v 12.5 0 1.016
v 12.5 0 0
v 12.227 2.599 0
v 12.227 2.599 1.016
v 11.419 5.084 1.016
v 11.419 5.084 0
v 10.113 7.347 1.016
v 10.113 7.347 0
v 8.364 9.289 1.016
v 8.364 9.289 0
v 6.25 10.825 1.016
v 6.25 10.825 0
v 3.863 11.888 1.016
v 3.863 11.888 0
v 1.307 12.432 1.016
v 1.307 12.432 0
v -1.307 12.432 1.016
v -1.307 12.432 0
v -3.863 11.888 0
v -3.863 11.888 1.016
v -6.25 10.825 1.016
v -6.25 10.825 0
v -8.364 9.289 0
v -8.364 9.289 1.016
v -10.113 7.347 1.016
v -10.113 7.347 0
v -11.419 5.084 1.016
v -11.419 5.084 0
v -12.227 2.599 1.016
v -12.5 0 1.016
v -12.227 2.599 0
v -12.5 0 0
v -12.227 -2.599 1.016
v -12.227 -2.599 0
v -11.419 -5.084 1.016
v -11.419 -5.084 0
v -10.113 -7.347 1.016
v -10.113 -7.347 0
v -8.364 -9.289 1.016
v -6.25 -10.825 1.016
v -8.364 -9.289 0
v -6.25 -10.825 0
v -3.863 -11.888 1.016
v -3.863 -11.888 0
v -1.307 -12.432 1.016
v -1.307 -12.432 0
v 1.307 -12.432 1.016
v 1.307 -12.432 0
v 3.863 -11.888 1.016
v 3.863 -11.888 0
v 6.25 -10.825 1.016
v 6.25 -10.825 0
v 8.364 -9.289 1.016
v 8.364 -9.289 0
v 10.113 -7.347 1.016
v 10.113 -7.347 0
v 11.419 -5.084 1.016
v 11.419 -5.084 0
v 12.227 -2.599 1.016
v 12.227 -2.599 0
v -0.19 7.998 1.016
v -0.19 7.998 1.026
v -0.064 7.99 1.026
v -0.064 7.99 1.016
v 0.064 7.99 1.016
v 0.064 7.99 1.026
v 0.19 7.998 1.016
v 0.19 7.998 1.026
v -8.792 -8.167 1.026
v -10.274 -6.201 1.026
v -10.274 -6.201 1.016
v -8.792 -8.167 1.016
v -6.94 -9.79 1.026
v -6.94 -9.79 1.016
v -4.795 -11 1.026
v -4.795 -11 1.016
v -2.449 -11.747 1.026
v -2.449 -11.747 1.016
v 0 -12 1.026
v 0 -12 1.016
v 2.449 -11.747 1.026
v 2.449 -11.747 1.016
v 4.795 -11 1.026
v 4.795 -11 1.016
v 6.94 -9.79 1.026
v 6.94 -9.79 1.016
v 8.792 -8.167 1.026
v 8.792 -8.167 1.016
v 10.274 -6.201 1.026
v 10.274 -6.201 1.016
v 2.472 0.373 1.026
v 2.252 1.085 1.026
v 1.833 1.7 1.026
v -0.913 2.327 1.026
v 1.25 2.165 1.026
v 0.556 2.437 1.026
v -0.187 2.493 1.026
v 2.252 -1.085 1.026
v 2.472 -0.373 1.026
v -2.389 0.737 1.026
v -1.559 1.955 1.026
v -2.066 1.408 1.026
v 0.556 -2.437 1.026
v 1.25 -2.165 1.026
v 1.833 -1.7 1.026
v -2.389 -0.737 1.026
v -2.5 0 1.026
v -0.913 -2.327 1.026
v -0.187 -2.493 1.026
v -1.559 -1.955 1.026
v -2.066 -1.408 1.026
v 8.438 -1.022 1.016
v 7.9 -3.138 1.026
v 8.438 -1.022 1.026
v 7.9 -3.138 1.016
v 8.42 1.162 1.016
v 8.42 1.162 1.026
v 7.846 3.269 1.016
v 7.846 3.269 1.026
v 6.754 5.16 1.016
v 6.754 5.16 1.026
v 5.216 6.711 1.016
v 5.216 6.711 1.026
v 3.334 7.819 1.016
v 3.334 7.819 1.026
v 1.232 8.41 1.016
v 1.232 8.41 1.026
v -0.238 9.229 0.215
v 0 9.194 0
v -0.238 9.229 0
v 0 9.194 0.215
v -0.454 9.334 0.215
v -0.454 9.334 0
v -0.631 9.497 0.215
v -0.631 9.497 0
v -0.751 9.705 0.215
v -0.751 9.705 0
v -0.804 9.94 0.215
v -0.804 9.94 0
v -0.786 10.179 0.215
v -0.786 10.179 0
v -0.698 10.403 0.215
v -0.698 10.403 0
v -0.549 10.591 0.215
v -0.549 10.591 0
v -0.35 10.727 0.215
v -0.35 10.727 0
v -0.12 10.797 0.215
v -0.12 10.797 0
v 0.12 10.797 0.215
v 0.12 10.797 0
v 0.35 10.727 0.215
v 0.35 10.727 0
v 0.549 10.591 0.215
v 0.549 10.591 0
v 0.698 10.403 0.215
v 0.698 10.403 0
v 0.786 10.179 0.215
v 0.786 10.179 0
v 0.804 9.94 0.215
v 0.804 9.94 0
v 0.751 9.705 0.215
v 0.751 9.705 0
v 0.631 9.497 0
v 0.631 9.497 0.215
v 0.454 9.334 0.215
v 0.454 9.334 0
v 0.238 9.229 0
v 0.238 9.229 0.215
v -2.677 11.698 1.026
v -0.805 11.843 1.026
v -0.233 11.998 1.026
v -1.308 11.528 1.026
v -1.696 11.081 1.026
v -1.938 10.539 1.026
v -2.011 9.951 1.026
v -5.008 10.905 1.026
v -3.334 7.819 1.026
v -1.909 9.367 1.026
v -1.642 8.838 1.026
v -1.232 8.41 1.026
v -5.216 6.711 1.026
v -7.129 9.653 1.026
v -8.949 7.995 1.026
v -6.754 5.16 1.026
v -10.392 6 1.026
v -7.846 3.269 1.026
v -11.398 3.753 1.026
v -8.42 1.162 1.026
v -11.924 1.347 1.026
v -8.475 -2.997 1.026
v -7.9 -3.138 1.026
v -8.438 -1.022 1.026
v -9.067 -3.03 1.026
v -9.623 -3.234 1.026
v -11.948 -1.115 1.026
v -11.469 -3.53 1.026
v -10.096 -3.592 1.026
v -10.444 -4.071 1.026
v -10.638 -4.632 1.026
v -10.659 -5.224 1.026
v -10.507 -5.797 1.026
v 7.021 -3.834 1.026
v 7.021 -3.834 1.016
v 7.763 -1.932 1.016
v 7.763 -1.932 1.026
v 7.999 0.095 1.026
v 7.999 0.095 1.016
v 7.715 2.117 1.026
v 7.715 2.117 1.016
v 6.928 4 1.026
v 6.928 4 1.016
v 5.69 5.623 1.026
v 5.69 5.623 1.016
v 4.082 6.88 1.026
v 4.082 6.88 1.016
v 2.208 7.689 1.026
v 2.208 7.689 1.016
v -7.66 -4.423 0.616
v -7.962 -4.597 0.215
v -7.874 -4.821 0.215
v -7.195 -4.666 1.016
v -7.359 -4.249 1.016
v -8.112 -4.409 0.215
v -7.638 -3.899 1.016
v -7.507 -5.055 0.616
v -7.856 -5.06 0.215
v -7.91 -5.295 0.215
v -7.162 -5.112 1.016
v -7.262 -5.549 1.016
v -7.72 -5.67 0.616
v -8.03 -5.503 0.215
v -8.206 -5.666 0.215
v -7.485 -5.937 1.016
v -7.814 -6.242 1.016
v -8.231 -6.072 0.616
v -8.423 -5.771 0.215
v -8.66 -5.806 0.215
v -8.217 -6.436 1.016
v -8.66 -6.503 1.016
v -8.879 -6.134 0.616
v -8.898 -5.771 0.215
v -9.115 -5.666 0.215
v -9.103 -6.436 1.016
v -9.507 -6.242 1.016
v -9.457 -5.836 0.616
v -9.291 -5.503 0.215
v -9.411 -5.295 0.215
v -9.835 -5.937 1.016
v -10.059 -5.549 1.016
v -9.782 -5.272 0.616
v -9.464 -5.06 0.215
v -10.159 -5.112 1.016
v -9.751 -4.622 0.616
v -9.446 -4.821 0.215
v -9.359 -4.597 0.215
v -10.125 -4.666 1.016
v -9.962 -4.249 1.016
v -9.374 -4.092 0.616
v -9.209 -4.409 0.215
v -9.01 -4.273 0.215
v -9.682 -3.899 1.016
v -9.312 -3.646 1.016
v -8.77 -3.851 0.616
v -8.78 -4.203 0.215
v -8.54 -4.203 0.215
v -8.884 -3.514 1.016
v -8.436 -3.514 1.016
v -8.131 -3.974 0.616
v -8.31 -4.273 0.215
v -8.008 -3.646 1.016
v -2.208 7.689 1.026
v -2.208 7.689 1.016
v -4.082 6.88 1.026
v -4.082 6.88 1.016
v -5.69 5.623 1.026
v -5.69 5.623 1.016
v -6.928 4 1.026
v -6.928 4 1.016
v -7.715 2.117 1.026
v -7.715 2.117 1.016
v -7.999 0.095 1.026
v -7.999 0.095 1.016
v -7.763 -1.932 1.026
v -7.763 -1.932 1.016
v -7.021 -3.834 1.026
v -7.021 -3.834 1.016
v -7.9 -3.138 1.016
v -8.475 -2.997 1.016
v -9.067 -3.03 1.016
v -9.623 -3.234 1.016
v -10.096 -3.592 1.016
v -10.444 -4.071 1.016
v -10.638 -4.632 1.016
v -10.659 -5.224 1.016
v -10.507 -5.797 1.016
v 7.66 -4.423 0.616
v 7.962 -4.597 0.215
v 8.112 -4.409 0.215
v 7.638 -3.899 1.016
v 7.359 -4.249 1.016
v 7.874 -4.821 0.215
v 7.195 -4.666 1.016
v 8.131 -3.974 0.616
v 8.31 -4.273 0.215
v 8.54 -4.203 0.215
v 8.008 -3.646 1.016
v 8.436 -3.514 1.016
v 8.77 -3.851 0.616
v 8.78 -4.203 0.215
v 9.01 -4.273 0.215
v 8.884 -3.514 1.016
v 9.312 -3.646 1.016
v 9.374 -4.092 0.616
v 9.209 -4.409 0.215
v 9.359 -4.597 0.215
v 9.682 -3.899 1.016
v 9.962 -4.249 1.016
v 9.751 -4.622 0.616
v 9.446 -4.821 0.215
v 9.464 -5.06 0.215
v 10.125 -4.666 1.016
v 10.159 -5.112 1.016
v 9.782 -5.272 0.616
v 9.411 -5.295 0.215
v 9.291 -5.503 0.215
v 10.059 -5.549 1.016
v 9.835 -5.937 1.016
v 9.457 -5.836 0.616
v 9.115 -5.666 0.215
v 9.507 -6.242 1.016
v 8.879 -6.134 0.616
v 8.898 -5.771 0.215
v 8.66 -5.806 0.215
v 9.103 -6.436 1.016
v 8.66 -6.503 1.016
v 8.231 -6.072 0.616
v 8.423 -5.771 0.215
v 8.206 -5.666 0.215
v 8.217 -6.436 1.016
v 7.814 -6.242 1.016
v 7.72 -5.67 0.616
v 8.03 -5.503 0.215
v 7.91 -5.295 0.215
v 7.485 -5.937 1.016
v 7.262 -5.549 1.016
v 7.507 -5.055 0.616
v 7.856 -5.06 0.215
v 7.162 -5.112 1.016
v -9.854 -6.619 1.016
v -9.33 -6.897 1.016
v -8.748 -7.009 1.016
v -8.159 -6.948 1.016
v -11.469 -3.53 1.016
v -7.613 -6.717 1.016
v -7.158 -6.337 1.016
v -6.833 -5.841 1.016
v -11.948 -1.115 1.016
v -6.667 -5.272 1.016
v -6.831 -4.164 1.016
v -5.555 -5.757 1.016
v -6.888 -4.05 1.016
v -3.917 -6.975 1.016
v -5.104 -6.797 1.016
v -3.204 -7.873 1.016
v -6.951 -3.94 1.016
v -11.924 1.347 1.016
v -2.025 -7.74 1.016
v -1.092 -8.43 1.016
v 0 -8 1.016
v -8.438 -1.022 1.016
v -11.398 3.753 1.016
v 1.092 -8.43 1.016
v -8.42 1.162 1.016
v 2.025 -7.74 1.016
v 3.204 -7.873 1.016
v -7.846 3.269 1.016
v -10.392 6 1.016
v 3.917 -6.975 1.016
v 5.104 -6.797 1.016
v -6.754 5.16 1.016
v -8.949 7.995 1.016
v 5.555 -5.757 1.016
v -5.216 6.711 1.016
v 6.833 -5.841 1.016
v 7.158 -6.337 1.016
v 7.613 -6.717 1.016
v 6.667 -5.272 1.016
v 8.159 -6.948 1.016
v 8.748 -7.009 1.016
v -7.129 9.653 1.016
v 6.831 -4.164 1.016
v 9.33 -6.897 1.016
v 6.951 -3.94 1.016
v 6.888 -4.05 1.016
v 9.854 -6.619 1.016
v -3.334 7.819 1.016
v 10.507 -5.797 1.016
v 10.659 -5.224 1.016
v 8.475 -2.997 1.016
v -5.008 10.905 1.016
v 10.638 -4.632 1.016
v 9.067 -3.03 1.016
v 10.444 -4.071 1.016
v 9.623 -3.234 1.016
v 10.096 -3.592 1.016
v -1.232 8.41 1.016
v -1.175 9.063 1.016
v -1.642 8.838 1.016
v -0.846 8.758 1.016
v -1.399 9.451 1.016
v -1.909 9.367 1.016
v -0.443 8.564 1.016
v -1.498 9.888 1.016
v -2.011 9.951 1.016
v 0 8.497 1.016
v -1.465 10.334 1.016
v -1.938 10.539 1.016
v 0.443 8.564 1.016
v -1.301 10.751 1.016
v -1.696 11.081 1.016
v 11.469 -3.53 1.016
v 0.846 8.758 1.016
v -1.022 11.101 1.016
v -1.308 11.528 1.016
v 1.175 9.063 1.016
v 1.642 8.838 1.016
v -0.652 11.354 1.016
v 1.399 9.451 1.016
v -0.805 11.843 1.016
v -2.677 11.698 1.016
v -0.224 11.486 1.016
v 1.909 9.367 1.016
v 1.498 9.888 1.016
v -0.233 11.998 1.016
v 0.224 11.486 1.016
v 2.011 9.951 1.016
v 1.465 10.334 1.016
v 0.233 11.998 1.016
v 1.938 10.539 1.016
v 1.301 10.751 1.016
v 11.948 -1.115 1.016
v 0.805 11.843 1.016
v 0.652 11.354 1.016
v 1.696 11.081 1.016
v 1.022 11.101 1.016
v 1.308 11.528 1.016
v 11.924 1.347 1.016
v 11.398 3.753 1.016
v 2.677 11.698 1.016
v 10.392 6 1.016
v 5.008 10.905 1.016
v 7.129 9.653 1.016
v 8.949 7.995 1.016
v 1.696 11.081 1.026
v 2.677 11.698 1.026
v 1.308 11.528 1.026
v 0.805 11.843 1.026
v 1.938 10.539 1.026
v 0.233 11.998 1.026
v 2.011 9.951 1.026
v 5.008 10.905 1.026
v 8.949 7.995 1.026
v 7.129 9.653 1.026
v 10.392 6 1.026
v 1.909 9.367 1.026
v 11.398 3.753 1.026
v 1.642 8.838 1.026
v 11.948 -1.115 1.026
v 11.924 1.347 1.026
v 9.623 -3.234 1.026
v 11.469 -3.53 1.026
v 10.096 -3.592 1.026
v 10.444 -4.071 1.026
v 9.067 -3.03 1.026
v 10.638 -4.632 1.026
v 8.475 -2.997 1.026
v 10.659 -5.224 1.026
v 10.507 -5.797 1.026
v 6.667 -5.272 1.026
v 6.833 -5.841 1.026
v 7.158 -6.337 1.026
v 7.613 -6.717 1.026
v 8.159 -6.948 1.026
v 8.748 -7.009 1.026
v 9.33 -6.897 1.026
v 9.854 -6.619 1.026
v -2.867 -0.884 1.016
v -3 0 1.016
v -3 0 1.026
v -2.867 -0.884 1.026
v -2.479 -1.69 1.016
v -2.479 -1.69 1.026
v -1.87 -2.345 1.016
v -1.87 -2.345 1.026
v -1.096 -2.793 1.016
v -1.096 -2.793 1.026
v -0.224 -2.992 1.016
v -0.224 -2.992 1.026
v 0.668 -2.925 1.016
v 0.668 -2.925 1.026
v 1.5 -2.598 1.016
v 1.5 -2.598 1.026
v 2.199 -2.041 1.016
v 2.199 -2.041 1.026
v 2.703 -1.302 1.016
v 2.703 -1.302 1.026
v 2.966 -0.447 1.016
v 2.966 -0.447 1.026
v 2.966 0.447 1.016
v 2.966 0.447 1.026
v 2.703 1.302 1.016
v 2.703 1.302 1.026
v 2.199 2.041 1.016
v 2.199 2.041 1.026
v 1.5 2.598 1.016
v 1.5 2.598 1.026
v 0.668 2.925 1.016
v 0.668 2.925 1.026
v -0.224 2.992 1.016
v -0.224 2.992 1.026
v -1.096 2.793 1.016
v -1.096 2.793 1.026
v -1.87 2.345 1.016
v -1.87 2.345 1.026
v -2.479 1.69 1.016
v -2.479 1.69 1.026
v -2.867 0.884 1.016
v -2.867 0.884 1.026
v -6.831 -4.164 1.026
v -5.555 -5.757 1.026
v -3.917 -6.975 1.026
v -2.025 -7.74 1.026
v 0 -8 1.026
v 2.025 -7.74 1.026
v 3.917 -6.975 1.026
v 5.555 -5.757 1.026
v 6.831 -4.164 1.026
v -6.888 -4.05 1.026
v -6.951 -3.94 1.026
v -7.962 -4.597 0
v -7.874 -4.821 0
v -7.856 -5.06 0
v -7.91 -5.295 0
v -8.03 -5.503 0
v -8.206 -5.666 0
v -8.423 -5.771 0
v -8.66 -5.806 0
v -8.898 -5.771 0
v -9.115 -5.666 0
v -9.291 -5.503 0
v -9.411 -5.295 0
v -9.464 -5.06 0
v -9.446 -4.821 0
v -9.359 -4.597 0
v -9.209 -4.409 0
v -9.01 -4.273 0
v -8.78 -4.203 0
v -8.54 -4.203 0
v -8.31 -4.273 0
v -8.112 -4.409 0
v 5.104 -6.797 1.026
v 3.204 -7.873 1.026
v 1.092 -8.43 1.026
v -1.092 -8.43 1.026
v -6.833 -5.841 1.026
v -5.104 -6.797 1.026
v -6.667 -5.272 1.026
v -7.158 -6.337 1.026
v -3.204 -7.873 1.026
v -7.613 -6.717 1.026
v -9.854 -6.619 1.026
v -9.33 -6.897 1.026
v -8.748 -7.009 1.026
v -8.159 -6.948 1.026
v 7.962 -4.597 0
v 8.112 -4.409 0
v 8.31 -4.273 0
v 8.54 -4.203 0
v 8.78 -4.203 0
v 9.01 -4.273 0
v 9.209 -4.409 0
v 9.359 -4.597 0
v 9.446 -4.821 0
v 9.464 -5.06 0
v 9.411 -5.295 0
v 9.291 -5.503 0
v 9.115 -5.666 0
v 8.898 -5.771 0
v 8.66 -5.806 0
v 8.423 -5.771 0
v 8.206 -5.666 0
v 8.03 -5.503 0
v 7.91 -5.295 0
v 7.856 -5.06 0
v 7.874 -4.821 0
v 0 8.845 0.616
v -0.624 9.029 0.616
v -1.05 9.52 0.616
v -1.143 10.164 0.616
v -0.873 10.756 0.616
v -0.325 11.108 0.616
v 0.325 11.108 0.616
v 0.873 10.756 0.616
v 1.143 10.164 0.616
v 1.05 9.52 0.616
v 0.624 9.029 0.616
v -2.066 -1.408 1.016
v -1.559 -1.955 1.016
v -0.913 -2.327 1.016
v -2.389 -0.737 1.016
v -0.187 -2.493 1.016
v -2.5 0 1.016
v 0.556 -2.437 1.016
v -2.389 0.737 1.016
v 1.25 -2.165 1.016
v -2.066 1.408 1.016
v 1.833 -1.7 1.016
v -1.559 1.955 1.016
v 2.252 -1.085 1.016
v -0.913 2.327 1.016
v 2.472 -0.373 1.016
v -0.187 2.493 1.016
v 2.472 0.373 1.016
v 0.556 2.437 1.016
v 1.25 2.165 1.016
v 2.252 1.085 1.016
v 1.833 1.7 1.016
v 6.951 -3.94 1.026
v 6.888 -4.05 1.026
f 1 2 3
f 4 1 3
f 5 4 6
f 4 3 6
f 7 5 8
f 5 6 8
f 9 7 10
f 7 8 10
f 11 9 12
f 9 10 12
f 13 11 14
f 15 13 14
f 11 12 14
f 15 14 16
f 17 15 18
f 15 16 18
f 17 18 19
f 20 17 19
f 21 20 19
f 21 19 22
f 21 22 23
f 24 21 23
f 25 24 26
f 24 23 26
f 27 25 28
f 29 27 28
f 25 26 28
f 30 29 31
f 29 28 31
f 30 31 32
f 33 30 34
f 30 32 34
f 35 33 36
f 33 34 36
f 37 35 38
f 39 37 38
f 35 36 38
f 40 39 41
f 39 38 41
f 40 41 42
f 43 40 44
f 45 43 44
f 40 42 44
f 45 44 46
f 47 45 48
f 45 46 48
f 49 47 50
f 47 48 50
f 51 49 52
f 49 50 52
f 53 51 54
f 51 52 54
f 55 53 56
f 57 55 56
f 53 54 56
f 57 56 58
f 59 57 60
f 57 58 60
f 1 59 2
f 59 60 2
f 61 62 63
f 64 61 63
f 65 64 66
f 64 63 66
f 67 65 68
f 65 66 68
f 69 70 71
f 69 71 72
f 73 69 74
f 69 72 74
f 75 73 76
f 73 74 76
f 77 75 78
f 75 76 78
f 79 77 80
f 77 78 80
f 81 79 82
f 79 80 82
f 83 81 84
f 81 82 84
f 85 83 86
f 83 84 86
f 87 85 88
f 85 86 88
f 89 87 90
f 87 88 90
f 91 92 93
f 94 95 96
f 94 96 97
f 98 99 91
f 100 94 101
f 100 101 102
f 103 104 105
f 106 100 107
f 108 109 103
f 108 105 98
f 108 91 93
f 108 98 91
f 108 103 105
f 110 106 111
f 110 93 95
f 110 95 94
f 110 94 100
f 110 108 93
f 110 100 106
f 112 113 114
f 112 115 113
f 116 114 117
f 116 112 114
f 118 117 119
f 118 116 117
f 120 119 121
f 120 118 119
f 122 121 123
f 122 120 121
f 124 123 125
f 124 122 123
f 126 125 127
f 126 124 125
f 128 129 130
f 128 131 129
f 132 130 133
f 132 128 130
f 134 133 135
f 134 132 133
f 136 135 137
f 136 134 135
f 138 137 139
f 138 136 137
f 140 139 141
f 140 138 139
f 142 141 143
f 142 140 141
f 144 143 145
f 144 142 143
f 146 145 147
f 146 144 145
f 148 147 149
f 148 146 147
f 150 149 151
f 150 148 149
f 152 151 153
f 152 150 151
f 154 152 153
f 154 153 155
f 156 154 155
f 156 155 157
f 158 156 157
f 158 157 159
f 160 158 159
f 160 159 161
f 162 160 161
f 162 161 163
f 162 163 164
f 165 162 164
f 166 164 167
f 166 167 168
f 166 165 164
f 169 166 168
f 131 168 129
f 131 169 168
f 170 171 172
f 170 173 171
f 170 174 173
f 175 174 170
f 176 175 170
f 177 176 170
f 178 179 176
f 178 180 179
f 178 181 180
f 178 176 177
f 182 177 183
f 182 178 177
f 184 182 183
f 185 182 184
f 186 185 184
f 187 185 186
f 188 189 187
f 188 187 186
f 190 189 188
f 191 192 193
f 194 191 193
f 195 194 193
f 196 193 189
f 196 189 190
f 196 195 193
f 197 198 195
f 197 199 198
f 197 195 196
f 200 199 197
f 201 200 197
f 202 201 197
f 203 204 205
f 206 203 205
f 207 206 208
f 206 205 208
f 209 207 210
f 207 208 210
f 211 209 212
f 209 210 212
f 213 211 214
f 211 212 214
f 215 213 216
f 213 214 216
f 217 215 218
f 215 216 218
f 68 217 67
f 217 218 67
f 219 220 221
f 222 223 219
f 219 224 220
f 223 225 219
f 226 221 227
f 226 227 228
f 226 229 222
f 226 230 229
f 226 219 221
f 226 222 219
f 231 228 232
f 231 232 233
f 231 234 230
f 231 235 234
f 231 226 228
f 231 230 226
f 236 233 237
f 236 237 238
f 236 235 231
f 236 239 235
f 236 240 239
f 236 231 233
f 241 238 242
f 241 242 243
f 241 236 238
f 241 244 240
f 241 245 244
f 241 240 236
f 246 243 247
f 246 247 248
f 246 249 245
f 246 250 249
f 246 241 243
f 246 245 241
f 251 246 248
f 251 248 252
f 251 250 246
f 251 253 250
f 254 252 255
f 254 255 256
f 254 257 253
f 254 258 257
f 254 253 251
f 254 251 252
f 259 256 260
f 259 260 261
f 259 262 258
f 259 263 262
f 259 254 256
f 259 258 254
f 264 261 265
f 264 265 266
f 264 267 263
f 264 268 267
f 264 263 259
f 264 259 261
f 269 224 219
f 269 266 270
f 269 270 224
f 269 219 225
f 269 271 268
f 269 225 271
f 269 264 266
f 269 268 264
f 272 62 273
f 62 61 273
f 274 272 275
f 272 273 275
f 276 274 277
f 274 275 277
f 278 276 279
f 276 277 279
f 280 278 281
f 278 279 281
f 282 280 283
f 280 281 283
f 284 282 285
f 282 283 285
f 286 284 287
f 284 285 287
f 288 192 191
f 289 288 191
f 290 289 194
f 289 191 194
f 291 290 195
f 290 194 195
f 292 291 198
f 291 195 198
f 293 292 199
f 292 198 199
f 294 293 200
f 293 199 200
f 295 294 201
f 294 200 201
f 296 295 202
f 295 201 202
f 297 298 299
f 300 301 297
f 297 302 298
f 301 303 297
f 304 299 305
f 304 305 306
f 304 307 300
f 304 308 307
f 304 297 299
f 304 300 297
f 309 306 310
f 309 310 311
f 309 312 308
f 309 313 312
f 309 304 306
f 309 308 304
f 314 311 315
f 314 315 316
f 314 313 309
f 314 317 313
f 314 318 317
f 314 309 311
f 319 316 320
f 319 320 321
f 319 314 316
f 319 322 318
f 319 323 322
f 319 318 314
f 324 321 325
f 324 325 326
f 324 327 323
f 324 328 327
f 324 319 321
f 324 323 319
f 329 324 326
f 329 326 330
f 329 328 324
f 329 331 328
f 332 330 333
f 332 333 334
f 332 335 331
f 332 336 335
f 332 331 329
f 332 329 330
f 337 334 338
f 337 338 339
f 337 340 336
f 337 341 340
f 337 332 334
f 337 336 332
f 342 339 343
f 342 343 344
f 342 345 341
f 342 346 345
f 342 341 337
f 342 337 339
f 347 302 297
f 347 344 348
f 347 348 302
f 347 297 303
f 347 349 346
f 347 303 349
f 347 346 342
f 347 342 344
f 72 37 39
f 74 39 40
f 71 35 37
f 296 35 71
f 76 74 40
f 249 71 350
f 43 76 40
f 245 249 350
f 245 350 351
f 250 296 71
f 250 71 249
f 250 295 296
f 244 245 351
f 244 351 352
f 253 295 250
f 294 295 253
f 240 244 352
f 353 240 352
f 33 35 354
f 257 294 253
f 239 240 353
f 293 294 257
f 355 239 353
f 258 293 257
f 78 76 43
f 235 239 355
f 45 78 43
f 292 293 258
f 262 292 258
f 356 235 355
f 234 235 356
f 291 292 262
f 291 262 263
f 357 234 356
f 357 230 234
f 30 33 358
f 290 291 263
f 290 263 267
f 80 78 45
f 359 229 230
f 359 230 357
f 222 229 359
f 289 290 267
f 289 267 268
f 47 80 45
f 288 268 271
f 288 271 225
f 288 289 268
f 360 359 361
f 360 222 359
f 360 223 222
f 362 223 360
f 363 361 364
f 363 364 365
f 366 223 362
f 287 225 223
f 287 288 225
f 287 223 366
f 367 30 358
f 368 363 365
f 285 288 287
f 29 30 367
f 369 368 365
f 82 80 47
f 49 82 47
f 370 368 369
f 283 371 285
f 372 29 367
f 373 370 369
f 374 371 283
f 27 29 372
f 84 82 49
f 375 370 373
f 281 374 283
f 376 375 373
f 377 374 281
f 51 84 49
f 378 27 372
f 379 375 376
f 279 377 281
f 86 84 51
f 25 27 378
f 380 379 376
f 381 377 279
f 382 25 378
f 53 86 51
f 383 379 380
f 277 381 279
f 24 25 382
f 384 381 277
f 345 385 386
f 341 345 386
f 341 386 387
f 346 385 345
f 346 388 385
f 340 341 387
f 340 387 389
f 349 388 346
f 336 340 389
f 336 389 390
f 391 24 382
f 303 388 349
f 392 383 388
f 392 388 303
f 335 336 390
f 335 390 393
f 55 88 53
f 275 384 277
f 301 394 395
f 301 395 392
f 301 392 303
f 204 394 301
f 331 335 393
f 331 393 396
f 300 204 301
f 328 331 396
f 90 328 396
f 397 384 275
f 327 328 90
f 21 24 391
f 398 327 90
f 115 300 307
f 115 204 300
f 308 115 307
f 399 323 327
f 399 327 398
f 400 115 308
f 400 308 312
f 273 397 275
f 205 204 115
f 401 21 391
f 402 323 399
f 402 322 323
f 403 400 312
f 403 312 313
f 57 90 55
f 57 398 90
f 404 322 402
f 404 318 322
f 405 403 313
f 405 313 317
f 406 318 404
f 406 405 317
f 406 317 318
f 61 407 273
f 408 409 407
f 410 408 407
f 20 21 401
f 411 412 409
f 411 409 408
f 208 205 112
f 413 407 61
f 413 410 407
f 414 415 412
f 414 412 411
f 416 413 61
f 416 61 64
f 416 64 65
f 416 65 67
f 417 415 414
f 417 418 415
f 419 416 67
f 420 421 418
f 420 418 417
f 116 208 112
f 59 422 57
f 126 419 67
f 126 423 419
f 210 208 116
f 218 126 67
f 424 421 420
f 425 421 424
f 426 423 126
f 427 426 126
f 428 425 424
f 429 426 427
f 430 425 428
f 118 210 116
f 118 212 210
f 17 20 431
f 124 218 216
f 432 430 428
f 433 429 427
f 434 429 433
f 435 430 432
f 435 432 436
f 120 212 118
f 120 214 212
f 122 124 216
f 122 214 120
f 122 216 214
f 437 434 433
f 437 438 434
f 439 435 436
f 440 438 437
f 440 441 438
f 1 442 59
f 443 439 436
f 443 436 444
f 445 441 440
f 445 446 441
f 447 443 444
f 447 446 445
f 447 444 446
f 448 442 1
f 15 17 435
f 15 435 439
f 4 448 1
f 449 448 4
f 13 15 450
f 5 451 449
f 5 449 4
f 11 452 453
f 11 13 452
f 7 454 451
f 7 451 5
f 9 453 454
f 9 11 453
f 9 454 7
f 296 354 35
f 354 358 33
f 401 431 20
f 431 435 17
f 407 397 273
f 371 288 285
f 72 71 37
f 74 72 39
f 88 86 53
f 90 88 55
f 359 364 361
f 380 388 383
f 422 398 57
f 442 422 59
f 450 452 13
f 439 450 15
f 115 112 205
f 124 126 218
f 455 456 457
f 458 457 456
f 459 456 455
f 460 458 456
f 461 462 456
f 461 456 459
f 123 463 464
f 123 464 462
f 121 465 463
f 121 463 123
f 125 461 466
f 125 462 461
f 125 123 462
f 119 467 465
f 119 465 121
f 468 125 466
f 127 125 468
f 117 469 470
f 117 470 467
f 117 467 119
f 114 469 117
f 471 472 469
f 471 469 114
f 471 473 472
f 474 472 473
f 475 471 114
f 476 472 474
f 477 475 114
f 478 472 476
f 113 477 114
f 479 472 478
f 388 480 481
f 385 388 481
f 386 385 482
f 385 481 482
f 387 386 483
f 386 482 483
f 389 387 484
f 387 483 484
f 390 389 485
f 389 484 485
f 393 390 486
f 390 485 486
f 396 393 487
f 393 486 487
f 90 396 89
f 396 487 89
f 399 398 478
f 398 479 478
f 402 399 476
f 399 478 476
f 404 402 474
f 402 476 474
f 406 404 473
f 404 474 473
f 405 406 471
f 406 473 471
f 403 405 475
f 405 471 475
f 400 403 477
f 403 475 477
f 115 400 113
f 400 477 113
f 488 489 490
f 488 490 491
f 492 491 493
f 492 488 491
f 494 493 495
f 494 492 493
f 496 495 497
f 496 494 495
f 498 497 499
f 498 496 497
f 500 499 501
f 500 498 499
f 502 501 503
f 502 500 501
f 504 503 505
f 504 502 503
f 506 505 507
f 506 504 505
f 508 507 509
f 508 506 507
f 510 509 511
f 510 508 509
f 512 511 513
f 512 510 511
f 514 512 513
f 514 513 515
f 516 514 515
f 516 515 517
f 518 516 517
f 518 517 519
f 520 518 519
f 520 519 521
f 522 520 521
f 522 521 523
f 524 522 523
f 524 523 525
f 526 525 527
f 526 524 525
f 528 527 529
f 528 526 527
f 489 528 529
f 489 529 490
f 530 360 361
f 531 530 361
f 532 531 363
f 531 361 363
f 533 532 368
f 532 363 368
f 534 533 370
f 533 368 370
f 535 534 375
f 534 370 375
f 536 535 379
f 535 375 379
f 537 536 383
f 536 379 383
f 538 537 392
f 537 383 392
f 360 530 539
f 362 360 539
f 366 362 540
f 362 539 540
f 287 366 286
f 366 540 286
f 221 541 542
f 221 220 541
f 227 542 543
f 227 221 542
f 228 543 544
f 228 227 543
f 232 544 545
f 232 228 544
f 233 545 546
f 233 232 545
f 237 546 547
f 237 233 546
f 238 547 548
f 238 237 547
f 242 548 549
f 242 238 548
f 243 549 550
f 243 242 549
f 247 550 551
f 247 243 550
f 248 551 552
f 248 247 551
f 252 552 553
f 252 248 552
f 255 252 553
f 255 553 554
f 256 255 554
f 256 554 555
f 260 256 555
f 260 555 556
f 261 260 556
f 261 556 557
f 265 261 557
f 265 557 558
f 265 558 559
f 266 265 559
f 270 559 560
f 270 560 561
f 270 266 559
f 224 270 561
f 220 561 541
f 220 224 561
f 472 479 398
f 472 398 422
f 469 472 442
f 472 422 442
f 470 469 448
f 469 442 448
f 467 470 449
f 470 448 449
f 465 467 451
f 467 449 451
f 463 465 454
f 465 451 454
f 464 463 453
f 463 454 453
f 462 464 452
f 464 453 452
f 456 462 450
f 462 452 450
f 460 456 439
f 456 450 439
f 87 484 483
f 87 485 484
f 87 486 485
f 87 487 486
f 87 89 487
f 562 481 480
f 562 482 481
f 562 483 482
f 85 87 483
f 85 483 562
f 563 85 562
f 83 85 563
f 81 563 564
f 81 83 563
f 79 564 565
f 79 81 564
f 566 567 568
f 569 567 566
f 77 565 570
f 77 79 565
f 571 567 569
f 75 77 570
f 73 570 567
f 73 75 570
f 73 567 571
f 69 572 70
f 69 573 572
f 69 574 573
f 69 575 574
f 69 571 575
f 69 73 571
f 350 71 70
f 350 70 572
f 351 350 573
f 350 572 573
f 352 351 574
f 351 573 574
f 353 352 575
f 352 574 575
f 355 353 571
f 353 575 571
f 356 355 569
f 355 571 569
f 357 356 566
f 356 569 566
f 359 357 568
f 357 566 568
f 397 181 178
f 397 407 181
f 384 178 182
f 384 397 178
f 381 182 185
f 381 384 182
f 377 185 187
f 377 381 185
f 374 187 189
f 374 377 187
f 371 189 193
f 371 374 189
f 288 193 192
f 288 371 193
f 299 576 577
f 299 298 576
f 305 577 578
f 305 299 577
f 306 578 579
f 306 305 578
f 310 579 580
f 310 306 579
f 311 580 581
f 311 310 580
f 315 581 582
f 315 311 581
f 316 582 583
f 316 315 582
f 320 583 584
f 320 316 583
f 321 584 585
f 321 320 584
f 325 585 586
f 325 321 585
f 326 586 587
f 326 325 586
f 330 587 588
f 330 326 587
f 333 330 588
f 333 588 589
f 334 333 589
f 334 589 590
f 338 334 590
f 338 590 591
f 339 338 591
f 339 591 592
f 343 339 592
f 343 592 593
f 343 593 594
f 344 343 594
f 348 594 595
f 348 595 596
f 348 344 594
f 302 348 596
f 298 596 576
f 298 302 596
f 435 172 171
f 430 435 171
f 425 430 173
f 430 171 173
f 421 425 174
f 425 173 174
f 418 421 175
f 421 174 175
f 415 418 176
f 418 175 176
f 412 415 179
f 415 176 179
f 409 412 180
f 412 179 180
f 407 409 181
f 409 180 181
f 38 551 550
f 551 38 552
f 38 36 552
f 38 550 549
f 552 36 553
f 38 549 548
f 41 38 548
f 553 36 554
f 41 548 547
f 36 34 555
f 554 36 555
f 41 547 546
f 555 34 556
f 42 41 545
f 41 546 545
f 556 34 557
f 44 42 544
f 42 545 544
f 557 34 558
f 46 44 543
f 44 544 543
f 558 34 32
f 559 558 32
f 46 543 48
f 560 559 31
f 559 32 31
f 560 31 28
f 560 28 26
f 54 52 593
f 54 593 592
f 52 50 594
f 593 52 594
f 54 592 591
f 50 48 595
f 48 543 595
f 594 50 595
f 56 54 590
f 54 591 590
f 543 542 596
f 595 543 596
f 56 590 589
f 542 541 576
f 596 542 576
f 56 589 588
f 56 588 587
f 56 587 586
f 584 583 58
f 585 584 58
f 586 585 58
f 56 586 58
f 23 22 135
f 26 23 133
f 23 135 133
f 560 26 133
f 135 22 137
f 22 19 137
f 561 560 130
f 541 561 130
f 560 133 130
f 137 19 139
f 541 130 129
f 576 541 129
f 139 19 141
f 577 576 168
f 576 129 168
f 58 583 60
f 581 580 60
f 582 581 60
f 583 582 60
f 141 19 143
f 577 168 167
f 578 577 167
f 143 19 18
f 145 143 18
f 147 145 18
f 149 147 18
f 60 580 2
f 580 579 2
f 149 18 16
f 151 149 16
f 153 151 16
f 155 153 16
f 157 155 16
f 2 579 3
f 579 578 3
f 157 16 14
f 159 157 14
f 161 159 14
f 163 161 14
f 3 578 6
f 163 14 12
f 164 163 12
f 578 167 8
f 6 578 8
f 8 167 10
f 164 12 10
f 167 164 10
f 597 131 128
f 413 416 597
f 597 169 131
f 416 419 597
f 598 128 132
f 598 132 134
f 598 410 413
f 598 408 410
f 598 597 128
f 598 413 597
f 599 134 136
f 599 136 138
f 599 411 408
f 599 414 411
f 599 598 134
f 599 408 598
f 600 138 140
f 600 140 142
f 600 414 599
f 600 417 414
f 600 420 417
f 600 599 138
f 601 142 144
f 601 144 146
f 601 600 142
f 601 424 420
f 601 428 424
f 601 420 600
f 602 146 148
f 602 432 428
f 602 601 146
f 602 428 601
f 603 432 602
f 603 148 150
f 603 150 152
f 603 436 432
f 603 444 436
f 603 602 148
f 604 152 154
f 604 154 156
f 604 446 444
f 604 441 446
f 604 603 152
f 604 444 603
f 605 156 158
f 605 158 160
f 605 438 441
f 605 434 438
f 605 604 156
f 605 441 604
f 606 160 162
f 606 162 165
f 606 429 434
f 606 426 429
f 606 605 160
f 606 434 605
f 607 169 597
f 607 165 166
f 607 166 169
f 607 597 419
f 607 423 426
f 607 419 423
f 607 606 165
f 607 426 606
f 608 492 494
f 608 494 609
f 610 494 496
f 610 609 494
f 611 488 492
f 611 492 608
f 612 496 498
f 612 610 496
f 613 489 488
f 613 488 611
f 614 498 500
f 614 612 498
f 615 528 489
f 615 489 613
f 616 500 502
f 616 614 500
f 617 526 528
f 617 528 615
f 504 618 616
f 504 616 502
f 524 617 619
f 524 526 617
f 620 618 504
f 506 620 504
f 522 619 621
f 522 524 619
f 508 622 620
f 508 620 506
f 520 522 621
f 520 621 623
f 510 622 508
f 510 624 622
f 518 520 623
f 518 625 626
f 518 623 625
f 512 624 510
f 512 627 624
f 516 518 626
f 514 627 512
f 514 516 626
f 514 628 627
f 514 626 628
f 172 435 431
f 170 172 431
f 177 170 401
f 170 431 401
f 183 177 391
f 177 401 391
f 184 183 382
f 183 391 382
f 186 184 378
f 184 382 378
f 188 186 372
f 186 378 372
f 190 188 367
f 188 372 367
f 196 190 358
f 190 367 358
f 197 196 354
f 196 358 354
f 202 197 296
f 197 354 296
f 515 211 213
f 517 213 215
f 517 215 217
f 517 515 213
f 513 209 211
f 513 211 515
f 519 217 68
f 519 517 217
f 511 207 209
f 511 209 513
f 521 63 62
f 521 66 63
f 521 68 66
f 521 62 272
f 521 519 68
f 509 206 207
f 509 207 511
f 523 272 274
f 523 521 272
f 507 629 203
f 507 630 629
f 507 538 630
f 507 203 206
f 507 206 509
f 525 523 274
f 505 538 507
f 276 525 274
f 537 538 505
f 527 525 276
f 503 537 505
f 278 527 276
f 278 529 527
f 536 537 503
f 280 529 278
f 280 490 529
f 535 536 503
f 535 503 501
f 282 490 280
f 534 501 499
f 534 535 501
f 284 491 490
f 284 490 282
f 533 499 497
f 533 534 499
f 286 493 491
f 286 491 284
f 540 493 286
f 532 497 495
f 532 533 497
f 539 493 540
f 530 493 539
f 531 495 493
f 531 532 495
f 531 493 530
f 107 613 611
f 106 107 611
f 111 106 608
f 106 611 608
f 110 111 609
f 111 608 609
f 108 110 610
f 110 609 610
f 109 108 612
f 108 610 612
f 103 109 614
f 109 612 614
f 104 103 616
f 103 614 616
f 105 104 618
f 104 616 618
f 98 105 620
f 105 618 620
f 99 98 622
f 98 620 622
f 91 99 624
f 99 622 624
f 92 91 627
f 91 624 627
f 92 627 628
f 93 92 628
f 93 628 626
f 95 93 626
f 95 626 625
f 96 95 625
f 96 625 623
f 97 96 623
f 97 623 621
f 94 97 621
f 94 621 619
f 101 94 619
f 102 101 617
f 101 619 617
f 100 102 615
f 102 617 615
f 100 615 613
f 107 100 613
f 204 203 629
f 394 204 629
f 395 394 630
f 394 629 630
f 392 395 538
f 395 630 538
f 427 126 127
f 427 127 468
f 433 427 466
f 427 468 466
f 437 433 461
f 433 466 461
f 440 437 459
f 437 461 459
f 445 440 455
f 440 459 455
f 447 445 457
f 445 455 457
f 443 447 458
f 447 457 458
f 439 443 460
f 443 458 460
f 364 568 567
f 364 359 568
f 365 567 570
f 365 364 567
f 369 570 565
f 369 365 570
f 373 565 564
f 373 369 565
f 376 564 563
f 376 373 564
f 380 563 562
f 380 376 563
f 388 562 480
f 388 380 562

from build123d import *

# Parameters (mm, degrees)
SKETCH1_R         = 12.5
EXTRUDE1_DEPTH    = 1.016
SKETCH2_R         = 12
SKETCH2_R_2       = 8.5
SKETCH2_R_3       = 8
SKETCH2_R_4       = 3
SKETCH2_R_5       = 2.5
EXTRUDE2_DEPTH    = 0.01
CIRPATTERN1_COUNT = 3
SKETCH6_R         = 2.0113
EXTRUDE5_DEPTH    = 0.01


with BuildPart() as part:
    # Sketch1 → Extrude1 (new body)
    with BuildSketch(Plane.XY):
        Circle(SKETCH1_R)
    extrude(amount=EXTRUDE1_DEPTH)

    # Sketch2 → Extrude2 (add)
    # profile 1 of 3: a face of its own
    with BuildSketch(Plane.XY.offset(1.016)):
        with Locations(Location((0, 0, 0), (0, 0, 180))):
            Circle(SKETCH2_R)
        with Locations(Location((0, 0, 0), (0, 0, 180))):
            Circle(SKETCH2_R_2, mode=Mode.SUBTRACT)
    # profile 2 of 3: a face of its own
    with BuildSketch(Plane.XY.offset(1.016)):
        with Locations(Location((0, 0, 0), (0, 0, 180))):
            Circle(SKETCH2_R_3)
        with Locations(Location((0, 0, 0), (0, 0, 180))):
            Circle(SKETCH2_R_4, mode=Mode.SUBTRACT)
    # profile 3 of 3: a face of its own
    with BuildSketch(Plane.XY.offset(1.016)):
        with Locations(Location((0, 0, 0), (0, 0, 180))):
            Circle(SKETCH2_R_5)
    extrude(amount=EXTRUDE2_DEPTH)

    # Sketch4 → CSK for #0 Flat Head Machine Screw1 (revolve, cut)
    with BuildSketch(Plane(origin=(0, 10, 1.026), x_dir=(0, -1, 0), z_dir=(1, 0, 0))):
        Polygon((0, 0), (0, 1.026), (0.80645, 1.026), (0.80645, 0.810837172), (1.5113, 0), align=None)
    csk_for_0_flat_head_machine_screw1 = revolve(axis=Axis((0, 10, 7.376), (0, 0, -1)), mode=Mode.SUBTRACT)

    # CirPattern1: CSK for #0 Flat Head Machine Screw1 ×3 about axis
    cirpattern1_axis = Axis((0, 0, 0), (0, 0, 1))
    for i in range(1, CIRPATTERN1_COUNT):
        add(csk_for_0_flat_head_machine_screw1.rotate(cirpattern1_axis, i * 360 / CIRPATTERN1_COUNT), mode=Mode.SUBTRACT)

    # Sketch6 → Extrude5 (cut)
    with BuildSketch(Plane.XY.offset(1.026)):
        with Locations((0, 10)):
            Circle(SKETCH6_R)
        with Locations((-8.660254038, -5)):
            Circle(SKETCH6_R)
        with Locations((8.660254038, -5)):
            Circle(SKETCH6_R)
    extrude(amount=-EXTRUDE5_DEPTH, mode=Mode.SUBTRACT)


solid = part.part
